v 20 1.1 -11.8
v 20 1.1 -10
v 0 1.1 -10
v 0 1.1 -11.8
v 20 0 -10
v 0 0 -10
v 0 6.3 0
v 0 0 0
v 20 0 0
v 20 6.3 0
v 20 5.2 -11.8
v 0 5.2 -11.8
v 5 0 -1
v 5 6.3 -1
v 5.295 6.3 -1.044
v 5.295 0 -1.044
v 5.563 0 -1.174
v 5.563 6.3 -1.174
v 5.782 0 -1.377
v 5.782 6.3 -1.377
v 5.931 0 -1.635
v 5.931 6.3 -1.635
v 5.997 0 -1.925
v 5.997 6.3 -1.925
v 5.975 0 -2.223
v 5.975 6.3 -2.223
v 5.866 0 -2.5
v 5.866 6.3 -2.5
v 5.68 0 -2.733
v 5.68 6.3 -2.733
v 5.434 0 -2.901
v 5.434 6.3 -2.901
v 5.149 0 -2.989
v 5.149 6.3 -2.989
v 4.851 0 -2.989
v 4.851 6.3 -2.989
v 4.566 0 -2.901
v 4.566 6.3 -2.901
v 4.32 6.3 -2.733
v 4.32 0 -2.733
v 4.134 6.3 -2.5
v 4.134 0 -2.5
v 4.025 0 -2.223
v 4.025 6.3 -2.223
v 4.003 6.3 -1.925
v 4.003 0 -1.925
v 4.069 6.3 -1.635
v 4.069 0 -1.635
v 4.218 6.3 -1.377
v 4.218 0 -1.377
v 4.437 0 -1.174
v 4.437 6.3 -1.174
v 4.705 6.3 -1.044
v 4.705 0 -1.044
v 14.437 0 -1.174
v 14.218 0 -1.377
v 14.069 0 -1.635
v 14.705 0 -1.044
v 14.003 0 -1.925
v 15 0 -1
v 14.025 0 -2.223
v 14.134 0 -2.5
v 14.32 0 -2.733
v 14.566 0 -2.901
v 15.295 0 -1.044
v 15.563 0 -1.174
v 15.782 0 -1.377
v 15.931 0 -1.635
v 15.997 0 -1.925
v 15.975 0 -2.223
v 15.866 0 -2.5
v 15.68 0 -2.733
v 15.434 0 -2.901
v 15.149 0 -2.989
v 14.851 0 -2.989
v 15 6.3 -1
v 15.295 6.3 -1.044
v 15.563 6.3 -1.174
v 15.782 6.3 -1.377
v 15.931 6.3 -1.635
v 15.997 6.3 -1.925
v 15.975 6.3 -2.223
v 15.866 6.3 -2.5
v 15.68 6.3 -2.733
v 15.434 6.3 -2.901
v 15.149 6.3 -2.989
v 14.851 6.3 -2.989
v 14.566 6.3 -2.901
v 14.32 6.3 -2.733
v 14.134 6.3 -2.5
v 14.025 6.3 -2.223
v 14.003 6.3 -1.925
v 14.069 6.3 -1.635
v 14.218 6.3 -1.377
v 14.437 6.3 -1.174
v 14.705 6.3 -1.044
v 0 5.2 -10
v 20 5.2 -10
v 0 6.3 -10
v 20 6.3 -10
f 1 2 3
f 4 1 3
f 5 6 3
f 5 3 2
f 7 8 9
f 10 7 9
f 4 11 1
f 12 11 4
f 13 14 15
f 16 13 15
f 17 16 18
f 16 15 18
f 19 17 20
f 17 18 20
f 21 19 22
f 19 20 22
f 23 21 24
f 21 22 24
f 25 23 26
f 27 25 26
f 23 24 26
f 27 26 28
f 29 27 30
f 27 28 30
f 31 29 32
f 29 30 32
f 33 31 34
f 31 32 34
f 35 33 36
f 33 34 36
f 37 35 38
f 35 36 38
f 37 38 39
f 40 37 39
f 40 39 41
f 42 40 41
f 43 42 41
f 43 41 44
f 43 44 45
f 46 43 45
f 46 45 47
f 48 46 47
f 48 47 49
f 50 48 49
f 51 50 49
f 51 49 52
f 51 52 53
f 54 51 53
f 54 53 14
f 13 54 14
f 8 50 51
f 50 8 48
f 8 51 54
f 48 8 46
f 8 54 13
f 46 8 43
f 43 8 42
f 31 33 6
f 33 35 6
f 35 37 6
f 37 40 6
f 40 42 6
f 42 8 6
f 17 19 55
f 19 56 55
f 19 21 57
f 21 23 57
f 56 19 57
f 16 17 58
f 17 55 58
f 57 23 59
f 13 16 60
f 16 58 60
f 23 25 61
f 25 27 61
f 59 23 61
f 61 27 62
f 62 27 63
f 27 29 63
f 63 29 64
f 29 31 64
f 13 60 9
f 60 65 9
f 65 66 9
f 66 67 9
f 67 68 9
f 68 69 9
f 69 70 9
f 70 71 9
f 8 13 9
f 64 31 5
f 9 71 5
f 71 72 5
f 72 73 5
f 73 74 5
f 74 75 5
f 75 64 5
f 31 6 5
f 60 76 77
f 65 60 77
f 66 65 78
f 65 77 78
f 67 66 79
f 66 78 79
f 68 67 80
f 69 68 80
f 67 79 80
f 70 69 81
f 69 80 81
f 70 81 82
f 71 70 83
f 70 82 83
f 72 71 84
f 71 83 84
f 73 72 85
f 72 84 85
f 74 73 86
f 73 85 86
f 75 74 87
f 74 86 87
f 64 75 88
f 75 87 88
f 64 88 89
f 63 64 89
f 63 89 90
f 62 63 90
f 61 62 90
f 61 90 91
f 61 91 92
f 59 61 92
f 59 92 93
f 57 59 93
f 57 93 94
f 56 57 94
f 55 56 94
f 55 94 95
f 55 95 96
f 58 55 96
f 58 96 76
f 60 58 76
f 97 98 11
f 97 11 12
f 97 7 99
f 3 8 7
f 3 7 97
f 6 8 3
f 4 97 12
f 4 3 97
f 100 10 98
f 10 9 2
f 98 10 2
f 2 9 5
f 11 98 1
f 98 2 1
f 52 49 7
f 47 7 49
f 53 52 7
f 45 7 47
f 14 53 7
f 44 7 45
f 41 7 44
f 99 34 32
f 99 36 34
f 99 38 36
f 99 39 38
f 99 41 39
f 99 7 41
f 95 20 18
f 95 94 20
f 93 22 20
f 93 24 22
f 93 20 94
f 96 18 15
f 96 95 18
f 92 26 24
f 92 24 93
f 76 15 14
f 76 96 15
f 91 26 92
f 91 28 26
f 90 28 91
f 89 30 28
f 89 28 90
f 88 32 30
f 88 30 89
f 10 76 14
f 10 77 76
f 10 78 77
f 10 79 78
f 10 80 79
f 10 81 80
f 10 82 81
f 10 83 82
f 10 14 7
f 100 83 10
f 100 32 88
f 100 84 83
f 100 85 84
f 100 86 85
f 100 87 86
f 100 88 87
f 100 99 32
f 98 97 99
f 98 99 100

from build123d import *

# Parameters (mm, degrees)
SKETCH1_W           = 20
SKETCH1_H           = 10
BOSS_EXTRUDE1_DEPTH = 6.3
SKETCH2_W           = 20
SKETCH2_H           = 4.1
BOSS_EXTRUDE2_DEPTH = 1.8
SKETCH3_R           = 1
CUT_EXTRUDE1_DEPTH  = 25.060964237


with BuildPart() as part:
    # Sketch1 → Boss-Extrude1 (new body)
    with BuildSketch(Plane(origin=(0, 0, 0), x_dir=(1, 0, 0), z_dir=(0, 1, 0))):
        with Locations((10, 5)):
            Rectangle(SKETCH1_W, SKETCH1_H)
    extrude(amount=BOSS_EXTRUDE1_DEPTH)

    # Sketch2 → Boss-Extrude2 (add)
    with BuildSketch(Plane(origin=(0, 0, -10), x_dir=(-1, 0, 0), z_dir=(0, 0, -1))):
        with Locations((-10, 3.15)):
            Rectangle(SKETCH2_W, SKETCH2_H)
    extrude(amount=BOSS_EXTRUDE2_DEPTH)

    # Sketch3 → Cut-Extrude1 (cut, through all)
    with BuildSketch(Plane(origin=(0, 6.3, 0), x_dir=(1, 0, 0), z_dir=(0, 1, 0))):
        with Locations(Location((5, 2, 0), (0, 0, 270))):
            Circle(SKETCH3_R)
        with Locations(Location((15, 2, 0), (0, 0, 270))):
            Circle(SKETCH3_R)
    extrude(amount=-CUT_EXTRUDE1_DEPTH, mode=Mode.SUBTRACT)


solid = part.part
